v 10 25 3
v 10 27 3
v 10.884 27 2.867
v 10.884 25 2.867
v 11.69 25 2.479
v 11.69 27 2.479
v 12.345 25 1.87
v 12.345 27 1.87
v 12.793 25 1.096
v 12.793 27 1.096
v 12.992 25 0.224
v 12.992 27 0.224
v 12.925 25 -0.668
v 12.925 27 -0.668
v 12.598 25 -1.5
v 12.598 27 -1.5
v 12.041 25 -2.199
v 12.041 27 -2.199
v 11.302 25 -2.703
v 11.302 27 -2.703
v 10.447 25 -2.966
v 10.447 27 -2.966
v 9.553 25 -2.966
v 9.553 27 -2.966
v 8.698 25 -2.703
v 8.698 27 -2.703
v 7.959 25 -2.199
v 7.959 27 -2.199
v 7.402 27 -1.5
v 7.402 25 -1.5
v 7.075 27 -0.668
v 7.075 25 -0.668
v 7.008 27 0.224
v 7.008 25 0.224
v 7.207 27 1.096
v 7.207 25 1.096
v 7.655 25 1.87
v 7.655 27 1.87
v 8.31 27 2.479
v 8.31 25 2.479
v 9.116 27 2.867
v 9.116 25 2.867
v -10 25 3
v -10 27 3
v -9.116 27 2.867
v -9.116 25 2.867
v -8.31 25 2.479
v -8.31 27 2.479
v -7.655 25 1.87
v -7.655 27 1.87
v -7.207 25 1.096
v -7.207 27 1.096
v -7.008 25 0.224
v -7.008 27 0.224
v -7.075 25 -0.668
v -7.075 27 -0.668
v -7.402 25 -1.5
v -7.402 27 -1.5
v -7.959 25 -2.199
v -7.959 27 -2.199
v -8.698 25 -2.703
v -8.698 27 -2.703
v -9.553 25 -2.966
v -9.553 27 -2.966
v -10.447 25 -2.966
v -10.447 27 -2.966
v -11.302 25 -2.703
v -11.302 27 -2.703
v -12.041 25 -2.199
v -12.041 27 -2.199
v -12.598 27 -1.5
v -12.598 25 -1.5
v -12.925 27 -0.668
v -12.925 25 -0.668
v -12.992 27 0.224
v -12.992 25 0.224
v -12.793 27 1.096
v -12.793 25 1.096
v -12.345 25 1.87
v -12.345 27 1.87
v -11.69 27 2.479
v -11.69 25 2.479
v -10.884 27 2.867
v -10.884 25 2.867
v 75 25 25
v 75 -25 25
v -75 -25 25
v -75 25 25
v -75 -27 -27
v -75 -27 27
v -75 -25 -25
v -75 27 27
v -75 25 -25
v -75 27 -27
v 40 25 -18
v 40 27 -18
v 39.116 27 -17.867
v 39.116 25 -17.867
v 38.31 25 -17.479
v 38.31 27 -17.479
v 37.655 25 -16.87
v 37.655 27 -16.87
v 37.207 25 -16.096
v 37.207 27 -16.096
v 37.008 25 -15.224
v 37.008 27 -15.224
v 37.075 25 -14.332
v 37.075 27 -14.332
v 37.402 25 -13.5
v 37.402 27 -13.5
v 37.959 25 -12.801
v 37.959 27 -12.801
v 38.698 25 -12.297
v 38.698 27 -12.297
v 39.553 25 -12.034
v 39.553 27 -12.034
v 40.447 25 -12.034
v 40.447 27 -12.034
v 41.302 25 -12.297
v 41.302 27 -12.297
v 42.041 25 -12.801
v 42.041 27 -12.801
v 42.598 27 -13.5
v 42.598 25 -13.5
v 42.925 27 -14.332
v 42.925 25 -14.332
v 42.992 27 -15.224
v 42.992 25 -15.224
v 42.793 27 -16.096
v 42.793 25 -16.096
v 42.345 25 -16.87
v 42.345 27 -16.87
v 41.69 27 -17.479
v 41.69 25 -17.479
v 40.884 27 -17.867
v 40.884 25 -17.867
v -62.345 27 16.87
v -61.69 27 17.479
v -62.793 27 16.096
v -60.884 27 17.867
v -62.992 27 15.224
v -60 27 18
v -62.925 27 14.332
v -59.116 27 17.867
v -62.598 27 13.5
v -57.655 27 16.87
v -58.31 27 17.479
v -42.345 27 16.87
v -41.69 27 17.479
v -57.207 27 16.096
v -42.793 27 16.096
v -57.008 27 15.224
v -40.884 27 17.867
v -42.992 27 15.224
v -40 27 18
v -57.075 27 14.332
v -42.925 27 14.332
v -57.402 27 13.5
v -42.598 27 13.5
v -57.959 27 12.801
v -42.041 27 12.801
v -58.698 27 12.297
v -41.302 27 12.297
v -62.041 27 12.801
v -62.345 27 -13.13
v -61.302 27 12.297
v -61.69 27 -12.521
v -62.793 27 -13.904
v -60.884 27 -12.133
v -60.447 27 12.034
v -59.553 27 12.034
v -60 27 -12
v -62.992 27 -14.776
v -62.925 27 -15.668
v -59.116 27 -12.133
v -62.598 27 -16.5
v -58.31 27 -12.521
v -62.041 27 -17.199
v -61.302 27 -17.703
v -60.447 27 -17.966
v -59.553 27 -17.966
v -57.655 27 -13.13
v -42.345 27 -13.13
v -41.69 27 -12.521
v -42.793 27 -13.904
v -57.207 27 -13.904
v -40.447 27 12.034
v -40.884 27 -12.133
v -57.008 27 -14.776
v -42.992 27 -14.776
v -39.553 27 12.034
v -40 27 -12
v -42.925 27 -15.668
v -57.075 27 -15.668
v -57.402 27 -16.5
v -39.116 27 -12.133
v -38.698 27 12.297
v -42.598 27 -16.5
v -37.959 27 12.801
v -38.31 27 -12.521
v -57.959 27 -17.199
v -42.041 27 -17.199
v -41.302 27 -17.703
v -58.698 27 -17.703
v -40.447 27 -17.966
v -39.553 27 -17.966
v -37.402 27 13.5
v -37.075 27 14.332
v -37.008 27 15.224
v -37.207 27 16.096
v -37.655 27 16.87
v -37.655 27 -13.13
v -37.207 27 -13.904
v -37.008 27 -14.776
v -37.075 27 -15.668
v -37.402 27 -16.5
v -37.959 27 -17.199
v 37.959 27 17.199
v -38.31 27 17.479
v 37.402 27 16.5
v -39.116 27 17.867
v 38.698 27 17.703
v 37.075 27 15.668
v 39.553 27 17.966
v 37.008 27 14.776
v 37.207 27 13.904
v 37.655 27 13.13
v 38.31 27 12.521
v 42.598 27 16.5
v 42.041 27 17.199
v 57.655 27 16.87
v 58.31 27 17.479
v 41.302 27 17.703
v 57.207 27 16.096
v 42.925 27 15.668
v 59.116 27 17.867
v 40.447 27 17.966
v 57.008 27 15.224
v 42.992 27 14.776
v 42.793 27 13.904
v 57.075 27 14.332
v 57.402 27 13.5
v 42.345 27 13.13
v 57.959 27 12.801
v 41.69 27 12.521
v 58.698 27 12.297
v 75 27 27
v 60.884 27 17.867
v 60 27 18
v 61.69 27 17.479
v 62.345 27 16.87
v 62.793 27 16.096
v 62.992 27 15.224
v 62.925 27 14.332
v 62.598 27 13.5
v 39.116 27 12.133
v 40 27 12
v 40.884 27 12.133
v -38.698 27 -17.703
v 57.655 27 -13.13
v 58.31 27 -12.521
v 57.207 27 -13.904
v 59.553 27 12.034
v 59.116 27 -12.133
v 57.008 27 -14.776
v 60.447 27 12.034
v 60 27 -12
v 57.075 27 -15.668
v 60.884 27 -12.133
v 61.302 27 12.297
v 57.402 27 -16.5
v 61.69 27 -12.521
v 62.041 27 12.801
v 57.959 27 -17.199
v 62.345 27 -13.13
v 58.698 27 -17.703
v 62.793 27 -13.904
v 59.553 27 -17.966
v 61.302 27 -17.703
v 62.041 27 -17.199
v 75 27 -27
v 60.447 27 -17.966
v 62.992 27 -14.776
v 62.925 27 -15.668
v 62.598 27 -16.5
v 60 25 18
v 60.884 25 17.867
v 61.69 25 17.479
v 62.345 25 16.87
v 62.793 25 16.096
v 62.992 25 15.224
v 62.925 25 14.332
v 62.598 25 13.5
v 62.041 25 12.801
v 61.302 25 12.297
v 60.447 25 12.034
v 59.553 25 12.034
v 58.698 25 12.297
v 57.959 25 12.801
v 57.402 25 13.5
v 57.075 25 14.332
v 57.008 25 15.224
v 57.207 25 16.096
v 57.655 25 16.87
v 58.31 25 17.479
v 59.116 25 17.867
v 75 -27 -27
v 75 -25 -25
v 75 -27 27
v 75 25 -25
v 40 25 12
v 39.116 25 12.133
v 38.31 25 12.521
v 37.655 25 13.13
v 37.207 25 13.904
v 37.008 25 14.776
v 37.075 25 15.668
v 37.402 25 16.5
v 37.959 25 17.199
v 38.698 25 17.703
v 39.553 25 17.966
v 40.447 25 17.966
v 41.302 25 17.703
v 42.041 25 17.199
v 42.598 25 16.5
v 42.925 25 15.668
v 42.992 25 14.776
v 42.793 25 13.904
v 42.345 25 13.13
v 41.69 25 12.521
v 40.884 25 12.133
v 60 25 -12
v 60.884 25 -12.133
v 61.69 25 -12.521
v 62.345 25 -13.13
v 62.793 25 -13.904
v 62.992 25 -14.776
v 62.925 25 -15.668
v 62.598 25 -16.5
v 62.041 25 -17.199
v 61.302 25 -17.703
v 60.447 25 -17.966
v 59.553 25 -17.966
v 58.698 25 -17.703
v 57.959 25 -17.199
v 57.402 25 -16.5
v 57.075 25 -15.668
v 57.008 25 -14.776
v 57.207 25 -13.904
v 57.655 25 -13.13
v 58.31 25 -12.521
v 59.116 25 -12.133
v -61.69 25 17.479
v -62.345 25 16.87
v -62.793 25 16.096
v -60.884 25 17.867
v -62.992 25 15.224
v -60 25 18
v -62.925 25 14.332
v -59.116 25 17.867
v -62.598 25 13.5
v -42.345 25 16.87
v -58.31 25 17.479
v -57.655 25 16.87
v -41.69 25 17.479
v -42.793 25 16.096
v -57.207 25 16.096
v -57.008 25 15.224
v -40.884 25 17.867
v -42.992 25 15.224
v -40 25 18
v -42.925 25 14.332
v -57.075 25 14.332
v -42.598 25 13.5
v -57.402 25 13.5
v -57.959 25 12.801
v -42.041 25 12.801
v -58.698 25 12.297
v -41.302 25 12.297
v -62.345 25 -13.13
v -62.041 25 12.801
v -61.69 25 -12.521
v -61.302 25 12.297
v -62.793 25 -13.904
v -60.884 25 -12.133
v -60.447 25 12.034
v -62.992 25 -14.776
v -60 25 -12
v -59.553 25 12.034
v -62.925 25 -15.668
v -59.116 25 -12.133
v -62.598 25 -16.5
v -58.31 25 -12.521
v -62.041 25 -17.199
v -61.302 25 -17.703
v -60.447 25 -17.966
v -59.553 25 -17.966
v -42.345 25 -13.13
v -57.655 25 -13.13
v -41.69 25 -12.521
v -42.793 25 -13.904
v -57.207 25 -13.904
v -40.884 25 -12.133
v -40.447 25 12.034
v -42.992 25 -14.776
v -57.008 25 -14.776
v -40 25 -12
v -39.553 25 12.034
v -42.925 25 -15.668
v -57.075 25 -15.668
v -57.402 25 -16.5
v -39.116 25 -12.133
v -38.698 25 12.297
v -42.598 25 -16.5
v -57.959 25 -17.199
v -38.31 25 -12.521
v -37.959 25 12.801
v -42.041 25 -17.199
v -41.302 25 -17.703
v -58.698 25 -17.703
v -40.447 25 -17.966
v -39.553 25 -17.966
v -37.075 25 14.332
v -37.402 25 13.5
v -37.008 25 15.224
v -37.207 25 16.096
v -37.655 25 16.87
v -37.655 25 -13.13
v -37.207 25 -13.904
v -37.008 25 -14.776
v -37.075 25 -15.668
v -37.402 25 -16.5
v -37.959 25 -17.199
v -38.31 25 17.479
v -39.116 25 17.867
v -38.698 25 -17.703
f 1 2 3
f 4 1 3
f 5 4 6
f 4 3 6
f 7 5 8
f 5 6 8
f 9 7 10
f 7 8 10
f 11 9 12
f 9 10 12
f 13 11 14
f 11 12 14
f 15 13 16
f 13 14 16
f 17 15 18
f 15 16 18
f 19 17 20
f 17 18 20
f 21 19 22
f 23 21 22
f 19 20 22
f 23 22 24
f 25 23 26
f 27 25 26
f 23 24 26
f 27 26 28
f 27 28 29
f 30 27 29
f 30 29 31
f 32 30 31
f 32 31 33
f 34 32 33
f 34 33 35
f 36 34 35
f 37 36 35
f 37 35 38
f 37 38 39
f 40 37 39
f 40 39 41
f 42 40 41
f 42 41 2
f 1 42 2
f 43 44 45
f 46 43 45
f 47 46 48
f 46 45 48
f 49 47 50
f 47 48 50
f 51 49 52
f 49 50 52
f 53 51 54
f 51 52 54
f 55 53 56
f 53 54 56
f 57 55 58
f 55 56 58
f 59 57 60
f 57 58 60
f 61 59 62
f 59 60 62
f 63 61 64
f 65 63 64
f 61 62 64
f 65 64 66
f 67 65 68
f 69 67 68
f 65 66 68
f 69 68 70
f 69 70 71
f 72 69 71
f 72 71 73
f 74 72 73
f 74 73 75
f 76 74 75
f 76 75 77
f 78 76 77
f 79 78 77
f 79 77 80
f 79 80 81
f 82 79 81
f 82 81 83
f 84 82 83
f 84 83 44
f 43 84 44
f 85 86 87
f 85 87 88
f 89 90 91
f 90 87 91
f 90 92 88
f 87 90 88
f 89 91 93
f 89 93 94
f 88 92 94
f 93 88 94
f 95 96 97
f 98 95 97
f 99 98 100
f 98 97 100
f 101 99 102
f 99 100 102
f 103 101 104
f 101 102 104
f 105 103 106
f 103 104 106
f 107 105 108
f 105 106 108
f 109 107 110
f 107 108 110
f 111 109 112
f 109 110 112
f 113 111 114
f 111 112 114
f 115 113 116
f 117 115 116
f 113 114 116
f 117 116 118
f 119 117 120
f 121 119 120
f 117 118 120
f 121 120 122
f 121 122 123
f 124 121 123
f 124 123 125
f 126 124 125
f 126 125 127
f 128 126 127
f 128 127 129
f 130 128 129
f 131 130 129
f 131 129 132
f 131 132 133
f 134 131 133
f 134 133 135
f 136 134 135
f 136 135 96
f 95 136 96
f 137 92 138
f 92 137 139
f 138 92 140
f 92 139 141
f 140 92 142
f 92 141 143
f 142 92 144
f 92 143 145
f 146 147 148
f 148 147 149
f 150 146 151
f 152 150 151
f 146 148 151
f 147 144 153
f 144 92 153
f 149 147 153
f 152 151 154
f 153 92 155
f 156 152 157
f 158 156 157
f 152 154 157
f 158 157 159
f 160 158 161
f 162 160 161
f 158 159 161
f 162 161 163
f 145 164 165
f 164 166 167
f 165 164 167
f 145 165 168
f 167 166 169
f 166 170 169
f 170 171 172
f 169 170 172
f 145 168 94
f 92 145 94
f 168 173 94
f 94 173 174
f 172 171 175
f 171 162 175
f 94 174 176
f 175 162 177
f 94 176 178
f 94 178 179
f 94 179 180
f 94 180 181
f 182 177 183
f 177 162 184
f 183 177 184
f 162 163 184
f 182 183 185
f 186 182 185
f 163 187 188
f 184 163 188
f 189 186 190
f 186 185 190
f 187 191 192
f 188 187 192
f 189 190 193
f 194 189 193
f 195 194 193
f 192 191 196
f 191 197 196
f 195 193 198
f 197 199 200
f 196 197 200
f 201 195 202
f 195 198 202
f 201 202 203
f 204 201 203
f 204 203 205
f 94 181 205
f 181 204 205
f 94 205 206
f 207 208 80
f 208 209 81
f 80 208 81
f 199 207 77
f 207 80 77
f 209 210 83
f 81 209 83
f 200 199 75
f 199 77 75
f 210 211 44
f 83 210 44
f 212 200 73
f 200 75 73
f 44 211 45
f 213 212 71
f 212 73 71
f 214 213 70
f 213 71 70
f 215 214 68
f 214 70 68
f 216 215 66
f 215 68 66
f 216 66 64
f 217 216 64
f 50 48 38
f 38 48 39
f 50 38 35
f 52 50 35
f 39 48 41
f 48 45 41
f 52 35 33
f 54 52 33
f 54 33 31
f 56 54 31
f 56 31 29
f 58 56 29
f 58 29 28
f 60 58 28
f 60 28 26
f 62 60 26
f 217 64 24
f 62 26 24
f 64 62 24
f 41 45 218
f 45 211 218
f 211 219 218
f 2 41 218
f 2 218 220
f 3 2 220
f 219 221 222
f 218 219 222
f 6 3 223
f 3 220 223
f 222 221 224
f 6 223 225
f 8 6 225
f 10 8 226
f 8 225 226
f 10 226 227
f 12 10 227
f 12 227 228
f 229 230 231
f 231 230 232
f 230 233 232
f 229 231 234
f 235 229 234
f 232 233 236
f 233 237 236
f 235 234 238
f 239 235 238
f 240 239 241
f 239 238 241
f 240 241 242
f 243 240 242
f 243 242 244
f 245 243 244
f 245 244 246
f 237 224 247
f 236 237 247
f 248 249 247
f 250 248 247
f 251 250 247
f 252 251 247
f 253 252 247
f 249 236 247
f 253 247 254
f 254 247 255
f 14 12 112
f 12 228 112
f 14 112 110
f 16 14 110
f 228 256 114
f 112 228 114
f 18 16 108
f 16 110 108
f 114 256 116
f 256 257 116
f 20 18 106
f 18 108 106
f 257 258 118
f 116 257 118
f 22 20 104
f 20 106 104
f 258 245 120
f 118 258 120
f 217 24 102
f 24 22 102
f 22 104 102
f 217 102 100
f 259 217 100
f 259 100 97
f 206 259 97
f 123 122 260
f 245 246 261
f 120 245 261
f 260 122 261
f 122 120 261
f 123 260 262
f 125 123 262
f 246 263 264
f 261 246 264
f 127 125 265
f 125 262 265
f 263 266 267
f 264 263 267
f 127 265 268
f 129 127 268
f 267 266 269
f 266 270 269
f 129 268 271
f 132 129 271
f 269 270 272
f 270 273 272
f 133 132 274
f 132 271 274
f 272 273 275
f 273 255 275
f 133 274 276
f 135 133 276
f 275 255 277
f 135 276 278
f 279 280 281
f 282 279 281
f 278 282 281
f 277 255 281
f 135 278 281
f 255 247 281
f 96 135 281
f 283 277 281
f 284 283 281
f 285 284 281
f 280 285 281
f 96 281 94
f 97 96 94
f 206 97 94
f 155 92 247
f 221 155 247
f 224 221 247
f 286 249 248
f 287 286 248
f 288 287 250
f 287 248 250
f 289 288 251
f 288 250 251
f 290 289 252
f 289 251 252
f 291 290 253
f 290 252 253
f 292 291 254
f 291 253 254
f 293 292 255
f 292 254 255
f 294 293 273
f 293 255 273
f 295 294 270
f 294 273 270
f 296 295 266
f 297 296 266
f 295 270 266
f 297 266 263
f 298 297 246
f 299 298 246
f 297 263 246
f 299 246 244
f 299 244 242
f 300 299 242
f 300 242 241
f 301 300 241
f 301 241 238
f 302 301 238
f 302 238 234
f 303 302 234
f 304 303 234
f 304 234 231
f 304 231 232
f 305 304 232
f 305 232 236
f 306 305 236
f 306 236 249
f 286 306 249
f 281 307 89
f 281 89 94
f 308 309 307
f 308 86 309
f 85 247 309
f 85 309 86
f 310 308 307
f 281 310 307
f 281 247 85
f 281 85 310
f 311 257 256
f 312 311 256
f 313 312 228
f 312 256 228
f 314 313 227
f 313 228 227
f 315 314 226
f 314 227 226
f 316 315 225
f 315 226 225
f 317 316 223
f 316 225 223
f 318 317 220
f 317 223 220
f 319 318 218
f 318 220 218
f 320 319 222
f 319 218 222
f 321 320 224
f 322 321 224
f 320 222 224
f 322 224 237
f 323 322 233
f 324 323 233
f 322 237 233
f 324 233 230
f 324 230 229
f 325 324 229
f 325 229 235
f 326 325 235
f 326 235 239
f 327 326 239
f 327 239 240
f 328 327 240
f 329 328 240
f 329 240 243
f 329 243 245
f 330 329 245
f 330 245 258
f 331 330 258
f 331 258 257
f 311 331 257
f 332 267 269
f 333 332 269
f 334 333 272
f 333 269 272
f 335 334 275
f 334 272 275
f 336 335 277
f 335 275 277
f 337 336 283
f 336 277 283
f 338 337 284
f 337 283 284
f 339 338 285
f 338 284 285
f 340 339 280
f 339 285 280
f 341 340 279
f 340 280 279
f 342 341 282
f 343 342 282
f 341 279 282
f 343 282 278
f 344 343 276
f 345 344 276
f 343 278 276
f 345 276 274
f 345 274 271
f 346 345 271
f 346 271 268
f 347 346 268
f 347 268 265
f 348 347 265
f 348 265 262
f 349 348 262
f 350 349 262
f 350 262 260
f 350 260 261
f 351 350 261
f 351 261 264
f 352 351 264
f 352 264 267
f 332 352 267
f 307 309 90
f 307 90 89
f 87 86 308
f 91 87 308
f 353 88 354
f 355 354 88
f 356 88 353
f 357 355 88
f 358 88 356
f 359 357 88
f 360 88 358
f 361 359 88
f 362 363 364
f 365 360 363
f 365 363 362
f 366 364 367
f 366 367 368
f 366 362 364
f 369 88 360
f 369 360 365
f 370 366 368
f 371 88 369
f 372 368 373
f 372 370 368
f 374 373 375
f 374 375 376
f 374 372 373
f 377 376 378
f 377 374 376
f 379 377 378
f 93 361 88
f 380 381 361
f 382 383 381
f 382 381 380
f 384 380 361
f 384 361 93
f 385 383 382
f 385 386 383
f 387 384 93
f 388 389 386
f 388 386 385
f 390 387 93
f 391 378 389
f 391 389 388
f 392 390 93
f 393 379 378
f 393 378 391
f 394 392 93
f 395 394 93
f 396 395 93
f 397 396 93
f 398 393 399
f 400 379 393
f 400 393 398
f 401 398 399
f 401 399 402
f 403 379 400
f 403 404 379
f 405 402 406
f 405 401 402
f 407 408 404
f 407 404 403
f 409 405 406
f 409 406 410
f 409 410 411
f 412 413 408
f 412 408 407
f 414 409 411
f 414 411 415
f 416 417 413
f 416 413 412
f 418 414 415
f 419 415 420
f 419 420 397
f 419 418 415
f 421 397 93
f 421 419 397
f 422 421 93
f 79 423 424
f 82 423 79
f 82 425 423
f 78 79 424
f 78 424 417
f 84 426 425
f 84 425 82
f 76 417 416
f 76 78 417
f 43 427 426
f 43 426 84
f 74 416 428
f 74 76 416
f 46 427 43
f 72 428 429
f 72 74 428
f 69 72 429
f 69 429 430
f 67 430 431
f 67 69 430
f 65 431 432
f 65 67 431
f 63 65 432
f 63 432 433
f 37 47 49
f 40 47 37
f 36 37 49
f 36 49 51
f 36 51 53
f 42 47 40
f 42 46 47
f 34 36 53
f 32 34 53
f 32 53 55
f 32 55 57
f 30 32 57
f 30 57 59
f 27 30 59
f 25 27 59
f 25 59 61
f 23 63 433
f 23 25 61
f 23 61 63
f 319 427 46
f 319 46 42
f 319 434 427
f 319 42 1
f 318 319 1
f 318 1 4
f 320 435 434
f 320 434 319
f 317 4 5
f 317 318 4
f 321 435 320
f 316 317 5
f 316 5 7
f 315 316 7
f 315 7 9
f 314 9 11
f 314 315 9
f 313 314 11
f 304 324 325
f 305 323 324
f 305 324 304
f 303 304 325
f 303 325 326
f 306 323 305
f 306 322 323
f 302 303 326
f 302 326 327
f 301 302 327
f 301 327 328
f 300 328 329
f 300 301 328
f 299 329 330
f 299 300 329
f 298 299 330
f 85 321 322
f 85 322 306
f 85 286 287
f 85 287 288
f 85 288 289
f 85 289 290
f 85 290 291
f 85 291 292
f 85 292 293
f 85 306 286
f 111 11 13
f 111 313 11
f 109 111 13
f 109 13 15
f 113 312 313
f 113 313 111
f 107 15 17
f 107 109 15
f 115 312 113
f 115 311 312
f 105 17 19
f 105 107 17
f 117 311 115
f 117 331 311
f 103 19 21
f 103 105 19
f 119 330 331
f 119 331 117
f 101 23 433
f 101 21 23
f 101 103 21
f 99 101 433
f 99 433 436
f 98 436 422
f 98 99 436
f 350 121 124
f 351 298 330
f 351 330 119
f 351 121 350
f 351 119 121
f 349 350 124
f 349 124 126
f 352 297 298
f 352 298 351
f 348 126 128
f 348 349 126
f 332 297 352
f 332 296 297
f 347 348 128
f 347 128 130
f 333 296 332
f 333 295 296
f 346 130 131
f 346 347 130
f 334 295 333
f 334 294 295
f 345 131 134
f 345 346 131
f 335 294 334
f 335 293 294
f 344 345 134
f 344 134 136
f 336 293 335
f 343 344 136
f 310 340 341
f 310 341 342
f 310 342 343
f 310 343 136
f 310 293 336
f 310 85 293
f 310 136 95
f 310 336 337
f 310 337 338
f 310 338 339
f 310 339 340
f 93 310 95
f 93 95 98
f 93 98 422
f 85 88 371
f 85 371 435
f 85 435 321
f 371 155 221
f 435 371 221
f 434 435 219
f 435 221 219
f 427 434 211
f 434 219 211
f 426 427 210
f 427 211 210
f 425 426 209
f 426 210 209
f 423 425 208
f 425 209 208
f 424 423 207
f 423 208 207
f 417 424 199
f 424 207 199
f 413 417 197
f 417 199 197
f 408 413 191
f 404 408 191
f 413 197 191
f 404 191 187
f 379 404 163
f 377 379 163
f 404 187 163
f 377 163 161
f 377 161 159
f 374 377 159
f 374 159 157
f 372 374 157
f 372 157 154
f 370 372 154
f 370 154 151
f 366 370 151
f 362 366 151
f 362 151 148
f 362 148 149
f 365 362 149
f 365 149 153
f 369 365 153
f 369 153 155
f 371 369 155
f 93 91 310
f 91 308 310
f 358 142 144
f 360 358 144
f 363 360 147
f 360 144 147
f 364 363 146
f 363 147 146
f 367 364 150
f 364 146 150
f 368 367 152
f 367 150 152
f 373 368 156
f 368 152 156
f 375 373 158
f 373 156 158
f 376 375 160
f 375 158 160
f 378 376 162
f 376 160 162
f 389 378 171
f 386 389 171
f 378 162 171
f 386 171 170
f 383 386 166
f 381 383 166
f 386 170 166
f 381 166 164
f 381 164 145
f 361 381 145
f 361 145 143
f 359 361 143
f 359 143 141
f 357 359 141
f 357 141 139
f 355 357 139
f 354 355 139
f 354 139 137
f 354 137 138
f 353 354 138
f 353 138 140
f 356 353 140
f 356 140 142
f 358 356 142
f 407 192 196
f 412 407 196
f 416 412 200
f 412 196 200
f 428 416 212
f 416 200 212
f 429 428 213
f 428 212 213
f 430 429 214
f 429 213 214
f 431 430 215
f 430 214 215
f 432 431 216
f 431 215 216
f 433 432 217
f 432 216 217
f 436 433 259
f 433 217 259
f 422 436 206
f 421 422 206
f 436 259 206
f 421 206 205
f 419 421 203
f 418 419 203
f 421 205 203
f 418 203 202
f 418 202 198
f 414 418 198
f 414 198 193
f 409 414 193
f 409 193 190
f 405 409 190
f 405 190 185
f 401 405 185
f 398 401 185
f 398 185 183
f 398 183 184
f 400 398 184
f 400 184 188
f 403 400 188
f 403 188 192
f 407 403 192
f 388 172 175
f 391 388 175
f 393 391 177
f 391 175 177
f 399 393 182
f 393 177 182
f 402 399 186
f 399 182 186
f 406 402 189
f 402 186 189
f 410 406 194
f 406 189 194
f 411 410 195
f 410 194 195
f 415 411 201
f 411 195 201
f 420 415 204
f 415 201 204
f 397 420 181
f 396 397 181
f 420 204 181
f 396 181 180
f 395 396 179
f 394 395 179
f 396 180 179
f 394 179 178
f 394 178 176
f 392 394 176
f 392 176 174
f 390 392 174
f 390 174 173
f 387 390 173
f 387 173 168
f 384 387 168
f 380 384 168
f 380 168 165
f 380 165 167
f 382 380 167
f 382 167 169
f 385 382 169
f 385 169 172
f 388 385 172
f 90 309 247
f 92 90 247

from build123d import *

# Parameters (mm, degrees)
SKETCH1_W           = 54
SKETCH1_H           = 54
SKETCH1_W_2         = 50
SKETCH1_H_2         = 50
BOSS_EXTRUDE1_DEPTH = 75
SKETCH2_R           = 3
CUT_EXTRUDE1_DEPTH  = 25
SKETCH3_R           = 3
CUT_EXTRUDE2_DEPTH  = 25


with BuildPart() as part:
    # Sketch1 → Boss-Extrude1 (new, symmetric)
    with BuildSketch(Plane(origin=(0, 0, 0), x_dir=(0, 0, -1), z_dir=(1, 0, 0))):
        Rectangle(SKETCH1_W, SKETCH1_H)
        Rectangle(SKETCH1_W_2, SKETCH1_H_2, mode=Mode.SUBTRACT)
    extrude(amount=BOSS_EXTRUDE1_DEPTH, both=True)

    # Sketch2 → Cut-Extrude1 (cut)
    with BuildSketch(Plane(origin=(0, 27, 0), x_dir=(1, 0, 0), z_dir=(0, 1, 0))):
        with Locations(Location((-60, 15, 0), (0, 0, 270))):
            Circle(SKETCH2_R)
        with Locations(Location((-60, -15, 0), (0, 0, 270))):
            Circle(SKETCH2_R)
        with Locations(Location((60, 15, 0), (0, 0, 270))):
            Circle(SKETCH2_R)
        with Locations(Location((60, -15, 0), (0, 0, 270))):
            Circle(SKETCH2_R)
        with Locations(Location((-40, -15, 0), (0, 0, 270))):
            Circle(SKETCH2_R)
        with Locations(Location((-40, 15, 0), (0, 0, 270))):
            Circle(SKETCH2_R)
        with Locations(Location((40, -15, 0), (0, 0, 90))):
            Circle(SKETCH2_R)
        with Locations(Location((40, 15, 0), (0, 0, 90))):
            Circle(SKETCH2_R)
    extrude(amount=-CUT_EXTRUDE1_DEPTH, mode=Mode.SUBTRACT)

    # Sketch3 → Cut-Extrude2 (cut)
    with BuildSketch(Plane(origin=(0, 27, 0), x_dir=(1, 0, 0), z_dir=(0, 1, 0))):
        with Locations(Location((-10, 0, 0), (0, 0, 270))):
            Circle(SKETCH3_R)
        with Locations(Location((10, 0, 0), (0, 0, 270))):
            Circle(SKETCH3_R)
    extrude(amount=-CUT_EXTRUDE2_DEPTH, mode=Mode.SUBTRACT)


solid = part.part
